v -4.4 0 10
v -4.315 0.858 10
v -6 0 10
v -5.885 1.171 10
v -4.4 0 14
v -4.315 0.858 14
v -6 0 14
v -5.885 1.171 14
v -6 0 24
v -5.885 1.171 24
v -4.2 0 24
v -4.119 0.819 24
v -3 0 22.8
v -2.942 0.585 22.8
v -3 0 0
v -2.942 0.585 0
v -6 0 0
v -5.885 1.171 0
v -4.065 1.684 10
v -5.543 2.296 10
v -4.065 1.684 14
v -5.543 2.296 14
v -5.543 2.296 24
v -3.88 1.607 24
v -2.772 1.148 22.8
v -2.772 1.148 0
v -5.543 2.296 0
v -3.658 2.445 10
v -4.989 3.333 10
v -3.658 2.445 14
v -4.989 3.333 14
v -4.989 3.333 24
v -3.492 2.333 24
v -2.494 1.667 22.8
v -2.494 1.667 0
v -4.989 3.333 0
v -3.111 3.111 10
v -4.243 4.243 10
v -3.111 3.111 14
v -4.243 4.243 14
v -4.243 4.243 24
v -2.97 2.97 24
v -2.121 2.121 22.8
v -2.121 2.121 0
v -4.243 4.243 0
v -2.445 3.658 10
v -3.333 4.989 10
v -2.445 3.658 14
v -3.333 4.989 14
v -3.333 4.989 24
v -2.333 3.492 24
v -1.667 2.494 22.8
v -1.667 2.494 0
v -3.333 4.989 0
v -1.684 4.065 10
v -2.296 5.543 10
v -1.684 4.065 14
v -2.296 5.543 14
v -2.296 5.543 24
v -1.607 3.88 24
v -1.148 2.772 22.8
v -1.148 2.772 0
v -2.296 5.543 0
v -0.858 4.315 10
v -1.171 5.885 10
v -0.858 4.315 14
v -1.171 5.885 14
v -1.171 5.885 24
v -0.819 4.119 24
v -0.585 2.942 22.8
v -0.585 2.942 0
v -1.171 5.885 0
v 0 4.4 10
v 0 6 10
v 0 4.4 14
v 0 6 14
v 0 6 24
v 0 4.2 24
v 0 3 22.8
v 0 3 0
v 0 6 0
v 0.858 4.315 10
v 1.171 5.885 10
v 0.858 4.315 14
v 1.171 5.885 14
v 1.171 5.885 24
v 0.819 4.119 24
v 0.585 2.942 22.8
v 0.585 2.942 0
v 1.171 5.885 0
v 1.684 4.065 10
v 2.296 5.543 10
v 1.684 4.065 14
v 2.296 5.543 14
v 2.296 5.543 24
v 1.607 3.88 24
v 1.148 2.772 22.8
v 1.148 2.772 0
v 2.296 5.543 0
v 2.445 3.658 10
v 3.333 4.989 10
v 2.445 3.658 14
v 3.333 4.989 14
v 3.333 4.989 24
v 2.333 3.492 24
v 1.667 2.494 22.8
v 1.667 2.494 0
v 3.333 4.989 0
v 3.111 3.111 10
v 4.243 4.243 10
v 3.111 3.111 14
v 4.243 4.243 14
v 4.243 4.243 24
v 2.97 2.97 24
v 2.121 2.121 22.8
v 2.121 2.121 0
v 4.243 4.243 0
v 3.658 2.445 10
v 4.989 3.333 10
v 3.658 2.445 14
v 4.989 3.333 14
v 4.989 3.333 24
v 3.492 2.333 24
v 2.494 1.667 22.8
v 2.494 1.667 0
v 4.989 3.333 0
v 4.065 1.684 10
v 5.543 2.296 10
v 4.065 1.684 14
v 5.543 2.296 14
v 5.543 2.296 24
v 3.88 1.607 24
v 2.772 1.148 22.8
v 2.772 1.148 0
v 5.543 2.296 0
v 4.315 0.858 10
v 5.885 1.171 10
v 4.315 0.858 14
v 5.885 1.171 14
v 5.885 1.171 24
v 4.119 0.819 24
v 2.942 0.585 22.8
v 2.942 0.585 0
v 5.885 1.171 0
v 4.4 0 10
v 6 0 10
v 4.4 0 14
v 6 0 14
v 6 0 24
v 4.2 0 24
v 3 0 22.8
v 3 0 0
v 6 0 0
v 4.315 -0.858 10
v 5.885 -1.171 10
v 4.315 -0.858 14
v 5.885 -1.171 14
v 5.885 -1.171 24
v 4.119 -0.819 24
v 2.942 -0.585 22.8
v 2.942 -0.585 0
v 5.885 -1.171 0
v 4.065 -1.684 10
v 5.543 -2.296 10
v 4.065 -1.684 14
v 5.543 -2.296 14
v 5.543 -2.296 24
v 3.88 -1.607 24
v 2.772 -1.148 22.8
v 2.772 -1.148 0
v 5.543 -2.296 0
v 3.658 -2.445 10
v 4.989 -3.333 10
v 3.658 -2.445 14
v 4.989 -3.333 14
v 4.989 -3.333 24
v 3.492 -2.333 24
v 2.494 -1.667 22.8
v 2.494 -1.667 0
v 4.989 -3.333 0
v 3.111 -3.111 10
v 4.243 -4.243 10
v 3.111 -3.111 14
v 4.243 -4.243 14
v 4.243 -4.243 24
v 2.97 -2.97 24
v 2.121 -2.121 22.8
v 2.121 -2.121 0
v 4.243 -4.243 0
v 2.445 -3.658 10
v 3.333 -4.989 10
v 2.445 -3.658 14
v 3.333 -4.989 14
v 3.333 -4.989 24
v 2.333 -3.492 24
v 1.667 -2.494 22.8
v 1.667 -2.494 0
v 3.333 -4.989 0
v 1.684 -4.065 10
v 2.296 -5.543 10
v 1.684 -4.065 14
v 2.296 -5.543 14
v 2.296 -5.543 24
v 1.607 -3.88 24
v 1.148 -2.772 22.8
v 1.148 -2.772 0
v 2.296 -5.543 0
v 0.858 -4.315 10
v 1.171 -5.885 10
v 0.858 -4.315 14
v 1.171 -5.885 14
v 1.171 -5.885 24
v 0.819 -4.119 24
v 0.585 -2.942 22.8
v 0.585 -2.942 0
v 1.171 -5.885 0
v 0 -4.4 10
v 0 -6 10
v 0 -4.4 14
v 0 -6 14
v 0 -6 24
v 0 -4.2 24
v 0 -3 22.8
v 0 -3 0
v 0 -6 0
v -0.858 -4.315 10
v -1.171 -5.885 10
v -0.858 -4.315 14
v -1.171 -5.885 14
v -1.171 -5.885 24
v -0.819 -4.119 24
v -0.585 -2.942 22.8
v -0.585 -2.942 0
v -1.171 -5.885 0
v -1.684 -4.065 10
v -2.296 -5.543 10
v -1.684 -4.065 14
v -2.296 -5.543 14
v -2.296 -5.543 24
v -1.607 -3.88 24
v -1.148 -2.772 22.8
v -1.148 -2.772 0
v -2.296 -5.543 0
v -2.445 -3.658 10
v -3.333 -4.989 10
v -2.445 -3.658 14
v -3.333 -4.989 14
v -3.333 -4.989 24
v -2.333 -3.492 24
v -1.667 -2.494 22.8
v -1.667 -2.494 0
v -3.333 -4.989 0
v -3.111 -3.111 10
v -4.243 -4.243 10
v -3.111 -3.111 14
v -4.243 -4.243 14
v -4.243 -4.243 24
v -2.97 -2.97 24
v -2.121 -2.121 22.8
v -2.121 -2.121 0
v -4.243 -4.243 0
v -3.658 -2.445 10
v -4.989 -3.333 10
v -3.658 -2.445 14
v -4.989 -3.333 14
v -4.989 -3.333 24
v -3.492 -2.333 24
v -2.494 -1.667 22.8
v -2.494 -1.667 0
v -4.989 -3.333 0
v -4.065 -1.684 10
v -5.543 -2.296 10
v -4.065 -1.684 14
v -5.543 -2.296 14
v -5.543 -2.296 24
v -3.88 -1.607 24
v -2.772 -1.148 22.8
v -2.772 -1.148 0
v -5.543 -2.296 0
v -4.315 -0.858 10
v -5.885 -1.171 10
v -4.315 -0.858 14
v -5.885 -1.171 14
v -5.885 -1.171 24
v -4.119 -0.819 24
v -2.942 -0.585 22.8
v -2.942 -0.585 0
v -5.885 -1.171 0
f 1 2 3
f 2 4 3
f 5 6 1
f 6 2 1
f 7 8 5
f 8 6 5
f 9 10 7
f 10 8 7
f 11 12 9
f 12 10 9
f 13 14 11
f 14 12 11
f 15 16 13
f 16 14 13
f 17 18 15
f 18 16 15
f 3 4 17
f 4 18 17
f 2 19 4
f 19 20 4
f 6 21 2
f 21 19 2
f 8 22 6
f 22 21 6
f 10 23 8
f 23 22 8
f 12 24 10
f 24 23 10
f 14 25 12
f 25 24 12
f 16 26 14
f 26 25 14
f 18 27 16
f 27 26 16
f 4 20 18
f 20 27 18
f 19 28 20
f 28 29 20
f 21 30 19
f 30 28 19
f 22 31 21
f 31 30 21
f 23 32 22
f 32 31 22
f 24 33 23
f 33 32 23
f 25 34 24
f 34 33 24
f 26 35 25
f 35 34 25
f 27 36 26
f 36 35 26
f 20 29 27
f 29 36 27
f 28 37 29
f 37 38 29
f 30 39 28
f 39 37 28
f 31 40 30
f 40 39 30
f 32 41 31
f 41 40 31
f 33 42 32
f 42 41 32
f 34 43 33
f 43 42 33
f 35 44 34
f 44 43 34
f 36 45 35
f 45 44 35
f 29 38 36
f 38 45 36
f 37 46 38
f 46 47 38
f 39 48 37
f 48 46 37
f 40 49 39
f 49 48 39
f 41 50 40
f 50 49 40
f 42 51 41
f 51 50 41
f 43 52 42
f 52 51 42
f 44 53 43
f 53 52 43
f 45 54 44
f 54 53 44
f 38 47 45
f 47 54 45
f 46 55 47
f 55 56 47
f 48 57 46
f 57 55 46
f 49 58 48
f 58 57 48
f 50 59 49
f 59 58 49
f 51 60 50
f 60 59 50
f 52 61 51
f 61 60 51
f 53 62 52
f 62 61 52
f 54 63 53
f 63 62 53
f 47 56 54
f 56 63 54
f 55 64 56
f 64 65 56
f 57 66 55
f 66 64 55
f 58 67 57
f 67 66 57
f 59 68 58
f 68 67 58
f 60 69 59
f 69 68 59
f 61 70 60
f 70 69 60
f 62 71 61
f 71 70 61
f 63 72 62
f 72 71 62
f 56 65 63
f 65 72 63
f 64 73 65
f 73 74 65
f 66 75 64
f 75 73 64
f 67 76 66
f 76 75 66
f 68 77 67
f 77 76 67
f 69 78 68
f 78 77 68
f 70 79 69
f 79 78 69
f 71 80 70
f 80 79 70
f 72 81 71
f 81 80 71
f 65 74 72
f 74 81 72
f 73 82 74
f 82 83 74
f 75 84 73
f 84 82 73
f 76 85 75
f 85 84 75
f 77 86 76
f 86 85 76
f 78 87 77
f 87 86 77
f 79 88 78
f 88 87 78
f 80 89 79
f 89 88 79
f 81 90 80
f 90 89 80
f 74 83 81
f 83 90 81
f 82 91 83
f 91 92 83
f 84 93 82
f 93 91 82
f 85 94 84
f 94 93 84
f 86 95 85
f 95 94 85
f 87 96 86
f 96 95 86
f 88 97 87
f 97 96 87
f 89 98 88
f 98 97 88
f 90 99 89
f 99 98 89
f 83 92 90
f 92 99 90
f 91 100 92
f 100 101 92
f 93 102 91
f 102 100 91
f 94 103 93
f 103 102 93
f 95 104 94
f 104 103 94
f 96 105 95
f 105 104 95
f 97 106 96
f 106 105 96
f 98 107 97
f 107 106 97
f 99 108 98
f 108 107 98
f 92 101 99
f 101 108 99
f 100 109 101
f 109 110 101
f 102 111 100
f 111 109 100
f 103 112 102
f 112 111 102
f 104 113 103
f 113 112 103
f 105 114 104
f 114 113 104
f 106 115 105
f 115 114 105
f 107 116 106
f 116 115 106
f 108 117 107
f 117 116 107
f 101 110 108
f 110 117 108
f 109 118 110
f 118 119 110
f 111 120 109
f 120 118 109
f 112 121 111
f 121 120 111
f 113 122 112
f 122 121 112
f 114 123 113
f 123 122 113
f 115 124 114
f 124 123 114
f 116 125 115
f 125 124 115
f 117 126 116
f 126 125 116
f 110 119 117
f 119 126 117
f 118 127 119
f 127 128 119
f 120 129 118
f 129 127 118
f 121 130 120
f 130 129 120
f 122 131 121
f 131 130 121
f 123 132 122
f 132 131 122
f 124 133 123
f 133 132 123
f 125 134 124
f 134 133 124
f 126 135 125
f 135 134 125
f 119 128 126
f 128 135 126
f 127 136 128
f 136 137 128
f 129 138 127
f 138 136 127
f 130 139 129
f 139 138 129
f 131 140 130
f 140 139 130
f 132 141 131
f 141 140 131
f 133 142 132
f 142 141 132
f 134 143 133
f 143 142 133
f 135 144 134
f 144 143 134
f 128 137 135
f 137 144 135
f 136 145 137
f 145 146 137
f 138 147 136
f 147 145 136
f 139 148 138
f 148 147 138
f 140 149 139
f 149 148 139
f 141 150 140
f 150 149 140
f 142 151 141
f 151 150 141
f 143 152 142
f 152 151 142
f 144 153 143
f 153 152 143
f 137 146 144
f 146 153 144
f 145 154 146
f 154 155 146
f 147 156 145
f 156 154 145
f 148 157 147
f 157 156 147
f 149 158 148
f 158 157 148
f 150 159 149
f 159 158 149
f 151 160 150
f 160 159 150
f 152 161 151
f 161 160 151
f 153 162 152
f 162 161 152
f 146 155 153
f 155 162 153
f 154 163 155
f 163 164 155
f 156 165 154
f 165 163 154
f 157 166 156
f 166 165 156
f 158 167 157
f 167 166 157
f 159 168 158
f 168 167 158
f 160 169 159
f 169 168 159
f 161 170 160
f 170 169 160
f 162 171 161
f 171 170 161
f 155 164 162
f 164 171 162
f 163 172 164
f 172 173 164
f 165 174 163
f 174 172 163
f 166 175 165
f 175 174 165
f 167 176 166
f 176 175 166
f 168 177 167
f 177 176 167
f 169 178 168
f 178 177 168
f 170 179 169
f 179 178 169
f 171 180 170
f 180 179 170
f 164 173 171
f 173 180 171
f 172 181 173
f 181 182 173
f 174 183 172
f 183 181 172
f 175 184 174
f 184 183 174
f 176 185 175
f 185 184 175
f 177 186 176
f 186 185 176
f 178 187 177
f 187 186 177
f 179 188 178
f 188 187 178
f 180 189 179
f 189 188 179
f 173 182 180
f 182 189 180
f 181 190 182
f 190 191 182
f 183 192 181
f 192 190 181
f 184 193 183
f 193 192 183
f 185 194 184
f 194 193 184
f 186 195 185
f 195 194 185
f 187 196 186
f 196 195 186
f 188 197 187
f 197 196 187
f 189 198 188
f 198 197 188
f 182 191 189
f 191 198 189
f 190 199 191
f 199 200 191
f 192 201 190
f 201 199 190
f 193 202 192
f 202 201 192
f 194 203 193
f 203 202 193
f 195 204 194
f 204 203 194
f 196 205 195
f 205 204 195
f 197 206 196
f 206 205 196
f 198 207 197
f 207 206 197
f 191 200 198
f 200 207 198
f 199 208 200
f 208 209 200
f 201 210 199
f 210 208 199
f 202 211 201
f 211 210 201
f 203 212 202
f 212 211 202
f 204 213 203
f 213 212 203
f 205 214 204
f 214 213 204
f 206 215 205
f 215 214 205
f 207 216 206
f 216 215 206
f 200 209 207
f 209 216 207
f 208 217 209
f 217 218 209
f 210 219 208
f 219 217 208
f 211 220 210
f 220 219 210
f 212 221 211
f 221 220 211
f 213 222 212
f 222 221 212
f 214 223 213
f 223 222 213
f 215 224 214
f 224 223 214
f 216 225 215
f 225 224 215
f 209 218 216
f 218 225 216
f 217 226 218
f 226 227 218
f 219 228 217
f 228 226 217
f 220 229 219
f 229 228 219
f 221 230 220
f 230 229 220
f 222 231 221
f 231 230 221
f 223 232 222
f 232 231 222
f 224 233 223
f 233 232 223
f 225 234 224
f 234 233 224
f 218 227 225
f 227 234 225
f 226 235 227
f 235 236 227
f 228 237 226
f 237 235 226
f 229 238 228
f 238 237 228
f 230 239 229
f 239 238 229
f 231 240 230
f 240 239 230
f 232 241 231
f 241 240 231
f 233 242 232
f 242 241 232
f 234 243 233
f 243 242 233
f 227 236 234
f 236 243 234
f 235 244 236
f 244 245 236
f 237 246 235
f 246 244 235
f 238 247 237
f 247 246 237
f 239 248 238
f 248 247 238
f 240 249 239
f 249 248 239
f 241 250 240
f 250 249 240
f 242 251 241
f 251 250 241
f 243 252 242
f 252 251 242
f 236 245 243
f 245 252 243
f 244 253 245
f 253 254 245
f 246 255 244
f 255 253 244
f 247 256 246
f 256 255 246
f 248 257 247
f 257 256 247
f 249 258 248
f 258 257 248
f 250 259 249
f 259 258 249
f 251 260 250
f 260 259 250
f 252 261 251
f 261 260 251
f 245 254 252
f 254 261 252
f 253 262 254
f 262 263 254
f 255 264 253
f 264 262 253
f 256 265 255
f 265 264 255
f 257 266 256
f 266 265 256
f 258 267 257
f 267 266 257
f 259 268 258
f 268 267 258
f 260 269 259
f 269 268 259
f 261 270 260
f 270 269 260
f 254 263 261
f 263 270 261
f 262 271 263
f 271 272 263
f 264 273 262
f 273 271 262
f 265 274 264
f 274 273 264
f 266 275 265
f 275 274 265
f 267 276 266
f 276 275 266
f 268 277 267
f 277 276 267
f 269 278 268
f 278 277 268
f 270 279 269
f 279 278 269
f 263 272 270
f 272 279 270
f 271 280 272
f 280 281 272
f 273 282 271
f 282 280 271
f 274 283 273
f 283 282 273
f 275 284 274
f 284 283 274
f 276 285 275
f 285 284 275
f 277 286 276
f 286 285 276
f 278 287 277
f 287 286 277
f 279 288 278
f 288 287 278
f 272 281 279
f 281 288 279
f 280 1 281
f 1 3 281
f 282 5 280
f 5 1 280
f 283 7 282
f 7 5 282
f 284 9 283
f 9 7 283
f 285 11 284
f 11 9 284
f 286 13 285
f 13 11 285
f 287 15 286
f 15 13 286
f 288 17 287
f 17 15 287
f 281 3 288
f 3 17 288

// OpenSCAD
$fn = 32;

// ----------------------------------------------------------------------
// Grooved revolve: thread_relief, bore R3
// ----------------------------------------------------------------------

// --- parameters (mm) ---
bore_r = 3;               // bore radius
outer_r = 6;              // outer radius of the body
total_h = 24;             // overall height, Z
wall = 3;                 // radial wall thickness
groove_w = 4;             // groove width
groove_d = 1.6;           // groove depth
grooves = 1;              // number of outer grooves
relief = 1.2;             // thread relief leg at the bore mouth
relief_angle = 45;        // thread relief chamfer angle, degrees
fit_tol = 0.02;           // declared fit tolerance (prompt contract)
free_tol = 0.2;           // declared free tolerance (prompt contract)

bbox_x = 2 * outer_r;  // full diameter
bore_d = 2 * bore_r;  // bore diameter
body_d = 2 * outer_r;  // body diameter
revolve_angle = 360;  // full turn around the Z axis

profile = [[3, 0], [6, 0], [6, 10], [4.4, 10], [4.4, 14], [6, 14], [6, 24], [4.2, 24], [3, 22.8]];  // primary outline, 9 points, counter clockwise

// --- the one profile operation ---
rotate_extrude(angle = revolve_angle) polygon(points = profile);
